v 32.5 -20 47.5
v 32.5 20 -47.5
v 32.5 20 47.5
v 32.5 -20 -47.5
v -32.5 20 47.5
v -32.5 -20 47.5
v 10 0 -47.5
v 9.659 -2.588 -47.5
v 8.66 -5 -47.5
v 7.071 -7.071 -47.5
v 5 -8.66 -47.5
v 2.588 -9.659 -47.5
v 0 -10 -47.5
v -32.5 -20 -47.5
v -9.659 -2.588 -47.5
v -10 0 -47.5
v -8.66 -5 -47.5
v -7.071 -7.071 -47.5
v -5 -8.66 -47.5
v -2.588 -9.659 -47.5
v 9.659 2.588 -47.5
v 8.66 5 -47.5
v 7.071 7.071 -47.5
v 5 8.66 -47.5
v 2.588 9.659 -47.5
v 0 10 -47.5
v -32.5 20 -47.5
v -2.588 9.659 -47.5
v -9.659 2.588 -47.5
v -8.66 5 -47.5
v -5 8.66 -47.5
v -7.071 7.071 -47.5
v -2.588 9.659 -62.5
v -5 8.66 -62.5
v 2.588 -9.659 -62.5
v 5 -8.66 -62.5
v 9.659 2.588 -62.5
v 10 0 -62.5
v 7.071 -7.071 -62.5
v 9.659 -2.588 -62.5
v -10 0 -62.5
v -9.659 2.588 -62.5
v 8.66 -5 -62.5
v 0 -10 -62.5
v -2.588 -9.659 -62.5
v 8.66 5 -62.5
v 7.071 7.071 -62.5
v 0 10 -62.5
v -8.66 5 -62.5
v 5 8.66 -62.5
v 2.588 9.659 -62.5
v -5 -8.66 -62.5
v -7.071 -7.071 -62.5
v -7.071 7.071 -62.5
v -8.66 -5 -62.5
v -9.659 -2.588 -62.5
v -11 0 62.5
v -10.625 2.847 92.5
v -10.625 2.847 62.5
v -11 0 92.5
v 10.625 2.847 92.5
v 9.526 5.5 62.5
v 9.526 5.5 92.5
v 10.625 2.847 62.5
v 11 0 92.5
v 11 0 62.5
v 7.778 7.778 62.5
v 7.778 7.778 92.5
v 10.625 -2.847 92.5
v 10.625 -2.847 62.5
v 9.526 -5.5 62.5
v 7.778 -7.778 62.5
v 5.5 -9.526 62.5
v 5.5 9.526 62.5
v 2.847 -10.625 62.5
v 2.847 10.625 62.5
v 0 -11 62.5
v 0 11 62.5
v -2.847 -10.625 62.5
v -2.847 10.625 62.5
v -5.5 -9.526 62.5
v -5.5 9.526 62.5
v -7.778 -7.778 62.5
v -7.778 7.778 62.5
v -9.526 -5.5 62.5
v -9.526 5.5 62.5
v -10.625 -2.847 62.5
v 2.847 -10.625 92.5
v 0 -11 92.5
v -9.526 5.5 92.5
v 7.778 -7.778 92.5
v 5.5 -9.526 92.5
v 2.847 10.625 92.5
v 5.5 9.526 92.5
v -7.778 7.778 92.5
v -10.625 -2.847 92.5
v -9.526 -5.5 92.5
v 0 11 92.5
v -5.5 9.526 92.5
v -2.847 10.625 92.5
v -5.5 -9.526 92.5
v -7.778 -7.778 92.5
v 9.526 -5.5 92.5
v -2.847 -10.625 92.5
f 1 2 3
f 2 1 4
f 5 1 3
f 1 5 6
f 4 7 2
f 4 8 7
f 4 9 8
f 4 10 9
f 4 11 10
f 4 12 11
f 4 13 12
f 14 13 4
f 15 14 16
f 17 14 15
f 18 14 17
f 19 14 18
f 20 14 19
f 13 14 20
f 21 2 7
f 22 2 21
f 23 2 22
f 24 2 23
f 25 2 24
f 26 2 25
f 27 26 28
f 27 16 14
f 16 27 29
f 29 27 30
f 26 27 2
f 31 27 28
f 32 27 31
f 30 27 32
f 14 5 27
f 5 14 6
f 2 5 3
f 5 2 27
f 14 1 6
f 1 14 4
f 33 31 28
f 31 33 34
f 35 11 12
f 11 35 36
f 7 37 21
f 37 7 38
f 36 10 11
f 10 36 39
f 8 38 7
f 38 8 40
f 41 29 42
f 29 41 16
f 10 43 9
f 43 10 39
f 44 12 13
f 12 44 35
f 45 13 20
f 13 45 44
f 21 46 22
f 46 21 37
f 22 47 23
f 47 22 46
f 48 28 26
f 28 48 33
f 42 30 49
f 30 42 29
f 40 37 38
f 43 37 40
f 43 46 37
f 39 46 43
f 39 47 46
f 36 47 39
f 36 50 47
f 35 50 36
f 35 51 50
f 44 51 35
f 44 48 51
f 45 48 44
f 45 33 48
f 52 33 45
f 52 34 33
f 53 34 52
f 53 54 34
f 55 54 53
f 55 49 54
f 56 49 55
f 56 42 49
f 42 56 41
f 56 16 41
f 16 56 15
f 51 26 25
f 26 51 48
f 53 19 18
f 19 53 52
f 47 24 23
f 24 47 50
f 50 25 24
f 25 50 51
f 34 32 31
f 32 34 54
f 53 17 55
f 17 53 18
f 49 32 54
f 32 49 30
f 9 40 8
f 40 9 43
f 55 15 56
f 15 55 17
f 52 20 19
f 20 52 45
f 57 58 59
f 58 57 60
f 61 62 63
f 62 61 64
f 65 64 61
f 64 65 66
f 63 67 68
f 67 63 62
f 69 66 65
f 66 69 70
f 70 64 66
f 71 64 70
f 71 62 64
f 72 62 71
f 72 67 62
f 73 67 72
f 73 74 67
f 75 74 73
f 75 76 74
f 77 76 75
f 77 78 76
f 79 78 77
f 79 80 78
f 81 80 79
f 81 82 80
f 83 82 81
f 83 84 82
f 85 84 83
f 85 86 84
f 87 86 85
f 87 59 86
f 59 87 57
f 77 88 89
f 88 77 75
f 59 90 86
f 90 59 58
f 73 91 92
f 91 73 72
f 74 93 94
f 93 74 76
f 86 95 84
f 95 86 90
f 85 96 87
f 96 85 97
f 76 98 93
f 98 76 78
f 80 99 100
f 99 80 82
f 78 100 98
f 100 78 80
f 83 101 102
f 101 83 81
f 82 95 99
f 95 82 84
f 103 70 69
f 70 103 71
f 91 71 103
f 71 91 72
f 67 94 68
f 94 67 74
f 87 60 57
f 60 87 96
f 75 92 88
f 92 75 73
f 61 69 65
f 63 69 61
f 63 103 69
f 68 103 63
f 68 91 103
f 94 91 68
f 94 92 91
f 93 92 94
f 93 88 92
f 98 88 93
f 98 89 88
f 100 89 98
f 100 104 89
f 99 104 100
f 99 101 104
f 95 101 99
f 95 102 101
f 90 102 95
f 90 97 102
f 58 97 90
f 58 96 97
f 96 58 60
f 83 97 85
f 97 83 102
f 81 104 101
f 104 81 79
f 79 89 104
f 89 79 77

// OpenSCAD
// Pressure switch (low-water / high-pressure alarm).
//
// @part pressure_switch
// @kind device
// @category device.pressure.switch
// @display-name "Pressure Switch (Potter PS10)"
// @mfg potter
// @mfg-pn PS10-2
// @listing UL FM
// @price-usd 95.00
// @install-minutes 15
// @crew journeyman
// @param size_in enum[0.25,0.5] default=0.5 label="Connection Size" unit="in"
// @port inlet position=[0,0,-0.055] direction=[0,0,-1] style=NPT_threaded size_in=0.5 role=branch

body_w = 65;
body_d = 40;
body_h = 95;
thread_d = 20;
thread_l = 15;
union() {
    cube(size = [body_w, body_d, body_h], center = true);
    // NPT thread entry bottom
    translate([0, 0, -body_h / 2 - thread_l / 2])
        cylinder(h = thread_l, d = thread_d, center = true, $fn = 24);
    // Conduit top
    translate([0, 0, body_h / 2 + 15])
        cylinder(h = 30, d = 22, $fn = 24);
}
